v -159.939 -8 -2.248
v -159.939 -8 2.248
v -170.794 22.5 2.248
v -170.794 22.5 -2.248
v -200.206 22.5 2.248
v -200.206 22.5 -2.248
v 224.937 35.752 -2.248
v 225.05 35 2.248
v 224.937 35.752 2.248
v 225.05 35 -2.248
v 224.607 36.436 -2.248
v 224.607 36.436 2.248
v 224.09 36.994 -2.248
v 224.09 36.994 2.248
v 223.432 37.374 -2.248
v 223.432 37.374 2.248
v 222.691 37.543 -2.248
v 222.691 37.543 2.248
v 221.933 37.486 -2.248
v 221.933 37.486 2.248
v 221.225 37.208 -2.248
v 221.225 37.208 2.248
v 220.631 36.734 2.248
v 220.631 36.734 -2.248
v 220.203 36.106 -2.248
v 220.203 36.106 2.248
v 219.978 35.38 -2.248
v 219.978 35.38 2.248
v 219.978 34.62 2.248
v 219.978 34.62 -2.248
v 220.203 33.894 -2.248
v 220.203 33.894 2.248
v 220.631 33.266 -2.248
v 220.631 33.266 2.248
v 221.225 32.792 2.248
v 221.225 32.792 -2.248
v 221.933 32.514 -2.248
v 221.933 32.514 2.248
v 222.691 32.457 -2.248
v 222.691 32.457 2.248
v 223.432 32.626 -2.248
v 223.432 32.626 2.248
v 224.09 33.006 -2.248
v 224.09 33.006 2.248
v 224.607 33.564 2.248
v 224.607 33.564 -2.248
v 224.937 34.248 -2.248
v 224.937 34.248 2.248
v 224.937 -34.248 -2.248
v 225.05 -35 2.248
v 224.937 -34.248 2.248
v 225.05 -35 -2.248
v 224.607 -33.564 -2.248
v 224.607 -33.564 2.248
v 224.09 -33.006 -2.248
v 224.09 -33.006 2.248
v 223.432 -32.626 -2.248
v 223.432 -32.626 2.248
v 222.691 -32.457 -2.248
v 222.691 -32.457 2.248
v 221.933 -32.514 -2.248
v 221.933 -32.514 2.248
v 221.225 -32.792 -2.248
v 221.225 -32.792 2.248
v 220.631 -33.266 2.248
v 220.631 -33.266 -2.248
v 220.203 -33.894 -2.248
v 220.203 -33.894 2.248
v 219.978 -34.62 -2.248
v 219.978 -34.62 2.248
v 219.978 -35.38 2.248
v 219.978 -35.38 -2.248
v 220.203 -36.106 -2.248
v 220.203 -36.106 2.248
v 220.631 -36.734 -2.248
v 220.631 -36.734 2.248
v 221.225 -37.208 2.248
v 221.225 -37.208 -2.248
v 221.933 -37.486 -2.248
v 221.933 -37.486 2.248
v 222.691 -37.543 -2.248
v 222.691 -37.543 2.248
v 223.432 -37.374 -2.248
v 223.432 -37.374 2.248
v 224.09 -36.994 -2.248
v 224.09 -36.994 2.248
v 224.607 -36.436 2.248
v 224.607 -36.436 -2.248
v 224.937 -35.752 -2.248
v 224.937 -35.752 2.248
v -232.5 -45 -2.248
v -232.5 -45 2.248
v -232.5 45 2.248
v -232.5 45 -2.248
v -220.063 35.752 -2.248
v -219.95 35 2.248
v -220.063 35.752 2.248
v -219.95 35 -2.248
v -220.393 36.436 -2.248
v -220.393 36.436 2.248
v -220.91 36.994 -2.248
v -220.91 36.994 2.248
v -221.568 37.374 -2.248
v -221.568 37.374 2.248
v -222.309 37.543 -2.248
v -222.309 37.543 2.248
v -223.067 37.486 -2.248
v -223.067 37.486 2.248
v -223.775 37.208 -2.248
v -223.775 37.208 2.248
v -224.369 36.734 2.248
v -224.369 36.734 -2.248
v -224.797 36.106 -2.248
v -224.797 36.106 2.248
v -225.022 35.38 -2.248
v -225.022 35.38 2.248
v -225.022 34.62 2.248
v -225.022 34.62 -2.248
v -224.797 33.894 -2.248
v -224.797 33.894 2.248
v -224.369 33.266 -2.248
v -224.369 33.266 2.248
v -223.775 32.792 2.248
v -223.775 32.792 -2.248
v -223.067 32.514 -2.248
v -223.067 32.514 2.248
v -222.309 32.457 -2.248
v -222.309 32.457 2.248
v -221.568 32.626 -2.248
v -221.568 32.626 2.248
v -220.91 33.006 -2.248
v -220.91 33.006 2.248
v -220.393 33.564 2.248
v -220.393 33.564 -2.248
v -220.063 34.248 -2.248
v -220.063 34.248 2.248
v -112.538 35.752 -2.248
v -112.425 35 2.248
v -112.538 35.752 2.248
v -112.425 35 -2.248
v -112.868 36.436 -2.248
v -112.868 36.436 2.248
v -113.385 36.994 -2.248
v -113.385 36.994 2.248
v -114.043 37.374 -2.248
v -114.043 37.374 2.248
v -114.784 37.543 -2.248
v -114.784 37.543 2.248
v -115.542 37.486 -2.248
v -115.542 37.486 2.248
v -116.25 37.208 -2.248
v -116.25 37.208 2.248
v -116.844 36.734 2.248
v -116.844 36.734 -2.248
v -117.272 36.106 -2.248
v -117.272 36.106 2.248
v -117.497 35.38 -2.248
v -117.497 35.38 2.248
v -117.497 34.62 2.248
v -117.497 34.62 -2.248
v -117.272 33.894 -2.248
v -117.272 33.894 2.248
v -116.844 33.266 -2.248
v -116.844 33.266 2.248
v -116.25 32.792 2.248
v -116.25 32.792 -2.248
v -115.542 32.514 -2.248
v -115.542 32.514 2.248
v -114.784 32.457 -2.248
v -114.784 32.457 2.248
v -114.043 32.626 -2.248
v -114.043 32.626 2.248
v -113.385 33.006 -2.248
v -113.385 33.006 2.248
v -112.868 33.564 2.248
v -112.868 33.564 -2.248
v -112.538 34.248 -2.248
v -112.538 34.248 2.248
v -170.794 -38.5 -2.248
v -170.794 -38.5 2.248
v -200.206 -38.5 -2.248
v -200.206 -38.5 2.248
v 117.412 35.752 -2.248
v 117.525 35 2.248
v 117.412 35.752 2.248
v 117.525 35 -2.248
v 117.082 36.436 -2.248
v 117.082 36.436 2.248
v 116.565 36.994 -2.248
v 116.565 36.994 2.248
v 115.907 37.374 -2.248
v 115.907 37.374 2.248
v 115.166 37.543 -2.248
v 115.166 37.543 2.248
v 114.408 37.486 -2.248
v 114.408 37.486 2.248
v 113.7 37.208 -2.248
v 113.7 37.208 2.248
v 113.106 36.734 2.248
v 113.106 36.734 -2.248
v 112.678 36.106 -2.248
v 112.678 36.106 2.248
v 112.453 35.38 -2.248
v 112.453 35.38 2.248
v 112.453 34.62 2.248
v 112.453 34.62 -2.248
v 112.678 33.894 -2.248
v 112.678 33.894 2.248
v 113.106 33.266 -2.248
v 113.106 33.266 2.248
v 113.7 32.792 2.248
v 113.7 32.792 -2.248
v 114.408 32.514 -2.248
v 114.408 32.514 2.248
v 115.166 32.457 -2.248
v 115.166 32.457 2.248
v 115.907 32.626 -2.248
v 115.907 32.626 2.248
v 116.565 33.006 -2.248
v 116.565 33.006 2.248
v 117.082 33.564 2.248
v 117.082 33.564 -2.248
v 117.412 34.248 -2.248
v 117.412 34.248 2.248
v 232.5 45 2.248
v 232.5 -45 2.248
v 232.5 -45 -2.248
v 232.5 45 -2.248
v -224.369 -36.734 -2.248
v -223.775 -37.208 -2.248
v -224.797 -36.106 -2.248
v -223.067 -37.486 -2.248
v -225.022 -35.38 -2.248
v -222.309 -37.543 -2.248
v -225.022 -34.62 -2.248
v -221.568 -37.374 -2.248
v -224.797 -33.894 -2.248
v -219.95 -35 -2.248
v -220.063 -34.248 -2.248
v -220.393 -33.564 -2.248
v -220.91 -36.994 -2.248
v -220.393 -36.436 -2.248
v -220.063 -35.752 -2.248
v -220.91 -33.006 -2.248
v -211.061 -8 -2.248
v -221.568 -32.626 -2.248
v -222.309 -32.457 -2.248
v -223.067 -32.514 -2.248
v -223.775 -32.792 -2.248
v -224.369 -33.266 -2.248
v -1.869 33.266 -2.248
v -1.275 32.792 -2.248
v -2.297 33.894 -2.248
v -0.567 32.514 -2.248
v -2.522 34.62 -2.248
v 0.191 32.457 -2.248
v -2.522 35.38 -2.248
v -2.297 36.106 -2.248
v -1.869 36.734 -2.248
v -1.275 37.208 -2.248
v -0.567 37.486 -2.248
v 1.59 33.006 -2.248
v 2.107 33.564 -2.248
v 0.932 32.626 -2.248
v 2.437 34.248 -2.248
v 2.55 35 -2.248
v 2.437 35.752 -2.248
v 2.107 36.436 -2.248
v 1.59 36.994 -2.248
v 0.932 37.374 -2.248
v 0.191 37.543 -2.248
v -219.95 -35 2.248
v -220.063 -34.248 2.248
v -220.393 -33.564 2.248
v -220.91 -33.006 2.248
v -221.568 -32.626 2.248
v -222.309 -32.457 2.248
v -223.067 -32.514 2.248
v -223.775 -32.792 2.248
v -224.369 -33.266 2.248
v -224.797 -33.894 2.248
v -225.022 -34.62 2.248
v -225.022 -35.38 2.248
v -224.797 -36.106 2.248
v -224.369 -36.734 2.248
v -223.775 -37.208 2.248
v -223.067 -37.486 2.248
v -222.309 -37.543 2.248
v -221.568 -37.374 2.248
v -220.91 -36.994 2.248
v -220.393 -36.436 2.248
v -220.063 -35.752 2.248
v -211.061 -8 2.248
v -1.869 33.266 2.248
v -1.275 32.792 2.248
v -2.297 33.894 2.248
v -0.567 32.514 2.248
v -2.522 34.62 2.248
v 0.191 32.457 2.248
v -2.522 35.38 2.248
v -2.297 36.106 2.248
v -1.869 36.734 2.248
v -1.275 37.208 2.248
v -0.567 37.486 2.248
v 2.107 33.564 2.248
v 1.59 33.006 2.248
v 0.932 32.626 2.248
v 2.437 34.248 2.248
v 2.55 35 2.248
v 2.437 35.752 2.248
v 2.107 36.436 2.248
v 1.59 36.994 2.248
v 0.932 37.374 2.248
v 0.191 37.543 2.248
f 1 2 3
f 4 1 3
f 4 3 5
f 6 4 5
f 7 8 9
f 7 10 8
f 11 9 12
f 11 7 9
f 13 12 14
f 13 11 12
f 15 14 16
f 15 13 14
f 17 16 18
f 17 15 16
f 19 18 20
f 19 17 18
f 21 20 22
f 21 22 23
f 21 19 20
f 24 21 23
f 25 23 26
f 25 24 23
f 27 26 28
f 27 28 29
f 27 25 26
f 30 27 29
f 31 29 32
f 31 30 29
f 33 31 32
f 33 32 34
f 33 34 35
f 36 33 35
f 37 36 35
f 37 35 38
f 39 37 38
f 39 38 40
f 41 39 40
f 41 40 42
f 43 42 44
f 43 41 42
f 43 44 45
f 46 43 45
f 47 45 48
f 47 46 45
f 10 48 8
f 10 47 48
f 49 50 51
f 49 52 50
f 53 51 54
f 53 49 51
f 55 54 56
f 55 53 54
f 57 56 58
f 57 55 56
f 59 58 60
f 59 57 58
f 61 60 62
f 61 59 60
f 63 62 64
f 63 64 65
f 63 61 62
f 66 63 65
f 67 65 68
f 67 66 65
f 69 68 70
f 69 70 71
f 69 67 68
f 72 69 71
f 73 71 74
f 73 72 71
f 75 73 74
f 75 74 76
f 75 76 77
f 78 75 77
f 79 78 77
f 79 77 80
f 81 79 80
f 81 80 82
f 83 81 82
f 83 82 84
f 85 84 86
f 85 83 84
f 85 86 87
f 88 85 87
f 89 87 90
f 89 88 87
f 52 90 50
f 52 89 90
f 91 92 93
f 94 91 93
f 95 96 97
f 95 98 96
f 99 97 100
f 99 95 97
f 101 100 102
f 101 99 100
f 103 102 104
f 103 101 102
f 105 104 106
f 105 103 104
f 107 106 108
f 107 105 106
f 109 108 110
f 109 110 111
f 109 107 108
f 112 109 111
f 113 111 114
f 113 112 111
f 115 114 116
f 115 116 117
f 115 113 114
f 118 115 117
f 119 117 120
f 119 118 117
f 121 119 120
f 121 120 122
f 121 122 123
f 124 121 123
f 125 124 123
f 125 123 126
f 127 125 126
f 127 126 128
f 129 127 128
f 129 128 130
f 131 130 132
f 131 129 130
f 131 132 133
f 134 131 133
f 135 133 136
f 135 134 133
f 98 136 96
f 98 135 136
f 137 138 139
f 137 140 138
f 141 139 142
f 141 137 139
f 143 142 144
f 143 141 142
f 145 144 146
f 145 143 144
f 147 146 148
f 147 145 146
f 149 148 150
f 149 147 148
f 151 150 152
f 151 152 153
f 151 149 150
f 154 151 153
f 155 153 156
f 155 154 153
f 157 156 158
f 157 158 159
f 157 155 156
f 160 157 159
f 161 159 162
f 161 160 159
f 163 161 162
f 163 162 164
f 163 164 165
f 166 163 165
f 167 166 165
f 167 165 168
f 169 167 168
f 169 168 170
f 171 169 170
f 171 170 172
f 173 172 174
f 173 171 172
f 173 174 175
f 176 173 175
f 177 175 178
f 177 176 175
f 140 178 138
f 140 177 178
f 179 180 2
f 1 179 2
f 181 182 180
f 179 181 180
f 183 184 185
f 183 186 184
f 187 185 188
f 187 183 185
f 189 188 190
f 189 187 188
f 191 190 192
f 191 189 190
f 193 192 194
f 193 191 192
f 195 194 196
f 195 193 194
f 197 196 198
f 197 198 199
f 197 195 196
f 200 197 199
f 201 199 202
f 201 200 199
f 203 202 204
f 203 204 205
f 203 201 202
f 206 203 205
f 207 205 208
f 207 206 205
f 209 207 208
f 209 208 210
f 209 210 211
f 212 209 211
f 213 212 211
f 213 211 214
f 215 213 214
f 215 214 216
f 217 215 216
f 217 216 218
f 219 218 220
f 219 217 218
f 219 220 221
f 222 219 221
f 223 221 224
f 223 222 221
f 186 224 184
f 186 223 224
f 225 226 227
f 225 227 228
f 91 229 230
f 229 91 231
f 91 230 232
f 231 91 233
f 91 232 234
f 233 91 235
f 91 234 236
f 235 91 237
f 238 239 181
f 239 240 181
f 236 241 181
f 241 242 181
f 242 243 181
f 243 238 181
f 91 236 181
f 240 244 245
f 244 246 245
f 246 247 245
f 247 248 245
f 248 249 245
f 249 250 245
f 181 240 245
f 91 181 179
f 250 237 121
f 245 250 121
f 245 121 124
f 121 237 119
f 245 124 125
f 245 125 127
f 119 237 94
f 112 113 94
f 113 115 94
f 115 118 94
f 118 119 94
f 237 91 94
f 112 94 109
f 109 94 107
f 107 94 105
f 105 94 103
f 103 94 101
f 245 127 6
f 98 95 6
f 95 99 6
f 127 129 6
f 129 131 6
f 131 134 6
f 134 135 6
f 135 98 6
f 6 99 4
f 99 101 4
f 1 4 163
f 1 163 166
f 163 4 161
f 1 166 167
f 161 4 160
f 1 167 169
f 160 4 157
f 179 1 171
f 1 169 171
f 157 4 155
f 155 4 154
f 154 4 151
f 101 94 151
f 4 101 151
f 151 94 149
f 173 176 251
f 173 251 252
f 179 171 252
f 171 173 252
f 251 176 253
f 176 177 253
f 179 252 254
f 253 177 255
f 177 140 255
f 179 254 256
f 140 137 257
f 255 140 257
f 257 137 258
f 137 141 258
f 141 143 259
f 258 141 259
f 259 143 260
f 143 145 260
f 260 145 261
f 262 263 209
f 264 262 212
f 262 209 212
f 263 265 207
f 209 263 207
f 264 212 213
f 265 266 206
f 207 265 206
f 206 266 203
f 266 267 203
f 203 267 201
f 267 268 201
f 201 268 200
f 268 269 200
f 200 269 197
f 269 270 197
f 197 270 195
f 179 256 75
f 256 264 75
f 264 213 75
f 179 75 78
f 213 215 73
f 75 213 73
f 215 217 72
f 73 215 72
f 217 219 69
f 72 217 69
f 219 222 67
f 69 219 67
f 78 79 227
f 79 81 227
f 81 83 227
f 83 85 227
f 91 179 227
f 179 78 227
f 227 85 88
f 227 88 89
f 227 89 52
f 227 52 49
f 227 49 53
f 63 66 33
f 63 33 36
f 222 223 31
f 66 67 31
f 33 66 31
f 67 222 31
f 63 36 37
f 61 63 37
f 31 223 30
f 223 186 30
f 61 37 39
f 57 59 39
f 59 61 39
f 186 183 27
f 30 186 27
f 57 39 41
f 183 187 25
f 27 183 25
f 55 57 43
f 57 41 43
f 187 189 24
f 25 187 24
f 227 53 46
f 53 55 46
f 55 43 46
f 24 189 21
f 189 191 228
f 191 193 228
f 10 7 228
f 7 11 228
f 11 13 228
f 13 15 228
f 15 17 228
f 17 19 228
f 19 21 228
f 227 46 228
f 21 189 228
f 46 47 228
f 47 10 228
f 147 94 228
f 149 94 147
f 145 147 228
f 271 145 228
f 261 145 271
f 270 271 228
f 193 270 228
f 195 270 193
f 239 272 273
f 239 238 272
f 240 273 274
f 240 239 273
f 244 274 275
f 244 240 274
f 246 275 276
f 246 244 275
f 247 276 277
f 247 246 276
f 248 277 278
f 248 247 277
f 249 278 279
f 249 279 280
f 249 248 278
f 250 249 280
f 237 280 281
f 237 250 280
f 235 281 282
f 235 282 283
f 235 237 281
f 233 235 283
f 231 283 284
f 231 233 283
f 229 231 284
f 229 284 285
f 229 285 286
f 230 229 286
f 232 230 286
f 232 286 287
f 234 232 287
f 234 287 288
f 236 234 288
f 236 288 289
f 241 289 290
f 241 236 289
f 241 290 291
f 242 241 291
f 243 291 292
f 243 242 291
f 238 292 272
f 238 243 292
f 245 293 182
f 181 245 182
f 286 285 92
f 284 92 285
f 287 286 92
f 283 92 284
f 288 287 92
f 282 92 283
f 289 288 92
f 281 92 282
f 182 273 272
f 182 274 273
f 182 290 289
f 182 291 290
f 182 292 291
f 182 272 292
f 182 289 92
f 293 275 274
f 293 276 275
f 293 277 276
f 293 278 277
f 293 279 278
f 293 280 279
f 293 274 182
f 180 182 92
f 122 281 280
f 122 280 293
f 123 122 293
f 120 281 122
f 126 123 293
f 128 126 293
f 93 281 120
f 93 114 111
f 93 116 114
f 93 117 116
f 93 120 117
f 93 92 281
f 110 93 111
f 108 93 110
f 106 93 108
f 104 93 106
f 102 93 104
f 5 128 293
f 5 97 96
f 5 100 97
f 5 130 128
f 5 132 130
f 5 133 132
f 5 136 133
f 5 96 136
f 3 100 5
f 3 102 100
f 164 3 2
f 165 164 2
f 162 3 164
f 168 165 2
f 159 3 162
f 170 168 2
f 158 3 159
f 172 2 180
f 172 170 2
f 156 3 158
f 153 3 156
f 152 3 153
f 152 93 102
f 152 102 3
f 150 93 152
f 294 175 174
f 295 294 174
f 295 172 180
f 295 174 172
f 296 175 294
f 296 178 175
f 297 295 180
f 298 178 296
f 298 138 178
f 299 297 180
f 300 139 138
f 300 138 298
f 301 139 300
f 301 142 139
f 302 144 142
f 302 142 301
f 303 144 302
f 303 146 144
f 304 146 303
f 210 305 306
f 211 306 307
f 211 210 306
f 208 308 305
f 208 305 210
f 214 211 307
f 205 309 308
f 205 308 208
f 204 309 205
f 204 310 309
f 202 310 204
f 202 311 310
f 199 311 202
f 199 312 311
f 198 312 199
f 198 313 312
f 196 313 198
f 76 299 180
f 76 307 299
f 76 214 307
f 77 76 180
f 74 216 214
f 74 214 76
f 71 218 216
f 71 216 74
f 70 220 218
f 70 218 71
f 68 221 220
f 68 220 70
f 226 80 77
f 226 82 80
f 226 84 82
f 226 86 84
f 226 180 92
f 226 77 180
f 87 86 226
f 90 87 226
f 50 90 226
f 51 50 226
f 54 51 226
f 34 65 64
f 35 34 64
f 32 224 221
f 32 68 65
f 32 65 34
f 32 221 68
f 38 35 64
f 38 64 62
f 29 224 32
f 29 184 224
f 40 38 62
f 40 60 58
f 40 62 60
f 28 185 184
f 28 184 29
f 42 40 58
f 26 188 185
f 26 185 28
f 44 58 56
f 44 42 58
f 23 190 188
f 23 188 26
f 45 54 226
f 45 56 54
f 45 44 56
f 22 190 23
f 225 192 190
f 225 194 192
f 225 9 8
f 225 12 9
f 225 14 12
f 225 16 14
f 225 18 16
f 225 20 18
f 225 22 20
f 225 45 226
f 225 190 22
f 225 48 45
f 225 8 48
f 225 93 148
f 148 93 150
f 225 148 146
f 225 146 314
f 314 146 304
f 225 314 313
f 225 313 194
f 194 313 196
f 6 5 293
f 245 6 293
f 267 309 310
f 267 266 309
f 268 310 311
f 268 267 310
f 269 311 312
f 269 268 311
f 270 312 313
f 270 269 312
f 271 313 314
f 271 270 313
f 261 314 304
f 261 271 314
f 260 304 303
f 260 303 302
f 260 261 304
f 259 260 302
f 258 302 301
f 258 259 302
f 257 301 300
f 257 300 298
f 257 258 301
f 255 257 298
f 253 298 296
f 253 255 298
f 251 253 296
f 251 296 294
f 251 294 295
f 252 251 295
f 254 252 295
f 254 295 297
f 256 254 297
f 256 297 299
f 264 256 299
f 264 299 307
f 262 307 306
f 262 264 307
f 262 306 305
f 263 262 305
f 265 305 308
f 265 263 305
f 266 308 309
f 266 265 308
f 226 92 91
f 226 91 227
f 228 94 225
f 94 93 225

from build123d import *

# Parameters (mm, degrees)
SKETCH1_W           = 465
SKETCH1_H           = 90
SKETCH1_R           = 2.55
BOSS_EXTRUDE1_DEPTH = 2.2479
CUT_EXTRUDE1_REACH  = 6.496


with BuildPart() as part:
    # Sketch1 → Boss-Extrude1 (new body, symmetric)
    with BuildSketch(Plane.XY):
        Rectangle(SKETCH1_W, SKETCH1_H)
        with Locations((-222.5, 35)):
            Circle(SKETCH1_R, mode=Mode.SUBTRACT)
        with Locations((-222.5, -35)):
            Circle(SKETCH1_R, mode=Mode.SUBTRACT)
        with Locations((0, 35)):
            Circle(SKETCH1_R, mode=Mode.SUBTRACT)
        with Locations((-114.975, 35)):
            Circle(SKETCH1_R, mode=Mode.SUBTRACT)
        with Locations((222.5, -35)):
            Circle(SKETCH1_R, mode=Mode.SUBTRACT)
        with Locations((222.5, 35)):
            Circle(SKETCH1_R, mode=Mode.SUBTRACT)
        with Locations((114.975, 35)):
            Circle(SKETCH1_R, mode=Mode.SUBTRACT)
    extrude(amount=BOSS_EXTRUDE1_DEPTH, both=True)

    # Sketch2 → Cut-Extrude1 (cut, up to next)
    with BuildSketch(Plane.XY.offset(2.2479), mode=Mode.PRIVATE) as cut_extrude1_sk1:
        Polygon((-159.938544521, -8), (-170.794476725, 22.5), (-200.205523275, 22.5), (-211.061455479, -8), (-200.205523275, -38.5), (-170.794476725, -38.5), align=None)
    cut_extrude1_tool1 = extrude(cut_extrude1_sk1.sketch, amount=-CUT_EXTRUDE1_REACH, mode=Mode.PRIVATE) & part.part
    add(cut_extrude1_tool1.solids().sort_by_distance((-185.5, -8, 2.2479))[0], mode=Mode.SUBTRACT)


solid = part.part
